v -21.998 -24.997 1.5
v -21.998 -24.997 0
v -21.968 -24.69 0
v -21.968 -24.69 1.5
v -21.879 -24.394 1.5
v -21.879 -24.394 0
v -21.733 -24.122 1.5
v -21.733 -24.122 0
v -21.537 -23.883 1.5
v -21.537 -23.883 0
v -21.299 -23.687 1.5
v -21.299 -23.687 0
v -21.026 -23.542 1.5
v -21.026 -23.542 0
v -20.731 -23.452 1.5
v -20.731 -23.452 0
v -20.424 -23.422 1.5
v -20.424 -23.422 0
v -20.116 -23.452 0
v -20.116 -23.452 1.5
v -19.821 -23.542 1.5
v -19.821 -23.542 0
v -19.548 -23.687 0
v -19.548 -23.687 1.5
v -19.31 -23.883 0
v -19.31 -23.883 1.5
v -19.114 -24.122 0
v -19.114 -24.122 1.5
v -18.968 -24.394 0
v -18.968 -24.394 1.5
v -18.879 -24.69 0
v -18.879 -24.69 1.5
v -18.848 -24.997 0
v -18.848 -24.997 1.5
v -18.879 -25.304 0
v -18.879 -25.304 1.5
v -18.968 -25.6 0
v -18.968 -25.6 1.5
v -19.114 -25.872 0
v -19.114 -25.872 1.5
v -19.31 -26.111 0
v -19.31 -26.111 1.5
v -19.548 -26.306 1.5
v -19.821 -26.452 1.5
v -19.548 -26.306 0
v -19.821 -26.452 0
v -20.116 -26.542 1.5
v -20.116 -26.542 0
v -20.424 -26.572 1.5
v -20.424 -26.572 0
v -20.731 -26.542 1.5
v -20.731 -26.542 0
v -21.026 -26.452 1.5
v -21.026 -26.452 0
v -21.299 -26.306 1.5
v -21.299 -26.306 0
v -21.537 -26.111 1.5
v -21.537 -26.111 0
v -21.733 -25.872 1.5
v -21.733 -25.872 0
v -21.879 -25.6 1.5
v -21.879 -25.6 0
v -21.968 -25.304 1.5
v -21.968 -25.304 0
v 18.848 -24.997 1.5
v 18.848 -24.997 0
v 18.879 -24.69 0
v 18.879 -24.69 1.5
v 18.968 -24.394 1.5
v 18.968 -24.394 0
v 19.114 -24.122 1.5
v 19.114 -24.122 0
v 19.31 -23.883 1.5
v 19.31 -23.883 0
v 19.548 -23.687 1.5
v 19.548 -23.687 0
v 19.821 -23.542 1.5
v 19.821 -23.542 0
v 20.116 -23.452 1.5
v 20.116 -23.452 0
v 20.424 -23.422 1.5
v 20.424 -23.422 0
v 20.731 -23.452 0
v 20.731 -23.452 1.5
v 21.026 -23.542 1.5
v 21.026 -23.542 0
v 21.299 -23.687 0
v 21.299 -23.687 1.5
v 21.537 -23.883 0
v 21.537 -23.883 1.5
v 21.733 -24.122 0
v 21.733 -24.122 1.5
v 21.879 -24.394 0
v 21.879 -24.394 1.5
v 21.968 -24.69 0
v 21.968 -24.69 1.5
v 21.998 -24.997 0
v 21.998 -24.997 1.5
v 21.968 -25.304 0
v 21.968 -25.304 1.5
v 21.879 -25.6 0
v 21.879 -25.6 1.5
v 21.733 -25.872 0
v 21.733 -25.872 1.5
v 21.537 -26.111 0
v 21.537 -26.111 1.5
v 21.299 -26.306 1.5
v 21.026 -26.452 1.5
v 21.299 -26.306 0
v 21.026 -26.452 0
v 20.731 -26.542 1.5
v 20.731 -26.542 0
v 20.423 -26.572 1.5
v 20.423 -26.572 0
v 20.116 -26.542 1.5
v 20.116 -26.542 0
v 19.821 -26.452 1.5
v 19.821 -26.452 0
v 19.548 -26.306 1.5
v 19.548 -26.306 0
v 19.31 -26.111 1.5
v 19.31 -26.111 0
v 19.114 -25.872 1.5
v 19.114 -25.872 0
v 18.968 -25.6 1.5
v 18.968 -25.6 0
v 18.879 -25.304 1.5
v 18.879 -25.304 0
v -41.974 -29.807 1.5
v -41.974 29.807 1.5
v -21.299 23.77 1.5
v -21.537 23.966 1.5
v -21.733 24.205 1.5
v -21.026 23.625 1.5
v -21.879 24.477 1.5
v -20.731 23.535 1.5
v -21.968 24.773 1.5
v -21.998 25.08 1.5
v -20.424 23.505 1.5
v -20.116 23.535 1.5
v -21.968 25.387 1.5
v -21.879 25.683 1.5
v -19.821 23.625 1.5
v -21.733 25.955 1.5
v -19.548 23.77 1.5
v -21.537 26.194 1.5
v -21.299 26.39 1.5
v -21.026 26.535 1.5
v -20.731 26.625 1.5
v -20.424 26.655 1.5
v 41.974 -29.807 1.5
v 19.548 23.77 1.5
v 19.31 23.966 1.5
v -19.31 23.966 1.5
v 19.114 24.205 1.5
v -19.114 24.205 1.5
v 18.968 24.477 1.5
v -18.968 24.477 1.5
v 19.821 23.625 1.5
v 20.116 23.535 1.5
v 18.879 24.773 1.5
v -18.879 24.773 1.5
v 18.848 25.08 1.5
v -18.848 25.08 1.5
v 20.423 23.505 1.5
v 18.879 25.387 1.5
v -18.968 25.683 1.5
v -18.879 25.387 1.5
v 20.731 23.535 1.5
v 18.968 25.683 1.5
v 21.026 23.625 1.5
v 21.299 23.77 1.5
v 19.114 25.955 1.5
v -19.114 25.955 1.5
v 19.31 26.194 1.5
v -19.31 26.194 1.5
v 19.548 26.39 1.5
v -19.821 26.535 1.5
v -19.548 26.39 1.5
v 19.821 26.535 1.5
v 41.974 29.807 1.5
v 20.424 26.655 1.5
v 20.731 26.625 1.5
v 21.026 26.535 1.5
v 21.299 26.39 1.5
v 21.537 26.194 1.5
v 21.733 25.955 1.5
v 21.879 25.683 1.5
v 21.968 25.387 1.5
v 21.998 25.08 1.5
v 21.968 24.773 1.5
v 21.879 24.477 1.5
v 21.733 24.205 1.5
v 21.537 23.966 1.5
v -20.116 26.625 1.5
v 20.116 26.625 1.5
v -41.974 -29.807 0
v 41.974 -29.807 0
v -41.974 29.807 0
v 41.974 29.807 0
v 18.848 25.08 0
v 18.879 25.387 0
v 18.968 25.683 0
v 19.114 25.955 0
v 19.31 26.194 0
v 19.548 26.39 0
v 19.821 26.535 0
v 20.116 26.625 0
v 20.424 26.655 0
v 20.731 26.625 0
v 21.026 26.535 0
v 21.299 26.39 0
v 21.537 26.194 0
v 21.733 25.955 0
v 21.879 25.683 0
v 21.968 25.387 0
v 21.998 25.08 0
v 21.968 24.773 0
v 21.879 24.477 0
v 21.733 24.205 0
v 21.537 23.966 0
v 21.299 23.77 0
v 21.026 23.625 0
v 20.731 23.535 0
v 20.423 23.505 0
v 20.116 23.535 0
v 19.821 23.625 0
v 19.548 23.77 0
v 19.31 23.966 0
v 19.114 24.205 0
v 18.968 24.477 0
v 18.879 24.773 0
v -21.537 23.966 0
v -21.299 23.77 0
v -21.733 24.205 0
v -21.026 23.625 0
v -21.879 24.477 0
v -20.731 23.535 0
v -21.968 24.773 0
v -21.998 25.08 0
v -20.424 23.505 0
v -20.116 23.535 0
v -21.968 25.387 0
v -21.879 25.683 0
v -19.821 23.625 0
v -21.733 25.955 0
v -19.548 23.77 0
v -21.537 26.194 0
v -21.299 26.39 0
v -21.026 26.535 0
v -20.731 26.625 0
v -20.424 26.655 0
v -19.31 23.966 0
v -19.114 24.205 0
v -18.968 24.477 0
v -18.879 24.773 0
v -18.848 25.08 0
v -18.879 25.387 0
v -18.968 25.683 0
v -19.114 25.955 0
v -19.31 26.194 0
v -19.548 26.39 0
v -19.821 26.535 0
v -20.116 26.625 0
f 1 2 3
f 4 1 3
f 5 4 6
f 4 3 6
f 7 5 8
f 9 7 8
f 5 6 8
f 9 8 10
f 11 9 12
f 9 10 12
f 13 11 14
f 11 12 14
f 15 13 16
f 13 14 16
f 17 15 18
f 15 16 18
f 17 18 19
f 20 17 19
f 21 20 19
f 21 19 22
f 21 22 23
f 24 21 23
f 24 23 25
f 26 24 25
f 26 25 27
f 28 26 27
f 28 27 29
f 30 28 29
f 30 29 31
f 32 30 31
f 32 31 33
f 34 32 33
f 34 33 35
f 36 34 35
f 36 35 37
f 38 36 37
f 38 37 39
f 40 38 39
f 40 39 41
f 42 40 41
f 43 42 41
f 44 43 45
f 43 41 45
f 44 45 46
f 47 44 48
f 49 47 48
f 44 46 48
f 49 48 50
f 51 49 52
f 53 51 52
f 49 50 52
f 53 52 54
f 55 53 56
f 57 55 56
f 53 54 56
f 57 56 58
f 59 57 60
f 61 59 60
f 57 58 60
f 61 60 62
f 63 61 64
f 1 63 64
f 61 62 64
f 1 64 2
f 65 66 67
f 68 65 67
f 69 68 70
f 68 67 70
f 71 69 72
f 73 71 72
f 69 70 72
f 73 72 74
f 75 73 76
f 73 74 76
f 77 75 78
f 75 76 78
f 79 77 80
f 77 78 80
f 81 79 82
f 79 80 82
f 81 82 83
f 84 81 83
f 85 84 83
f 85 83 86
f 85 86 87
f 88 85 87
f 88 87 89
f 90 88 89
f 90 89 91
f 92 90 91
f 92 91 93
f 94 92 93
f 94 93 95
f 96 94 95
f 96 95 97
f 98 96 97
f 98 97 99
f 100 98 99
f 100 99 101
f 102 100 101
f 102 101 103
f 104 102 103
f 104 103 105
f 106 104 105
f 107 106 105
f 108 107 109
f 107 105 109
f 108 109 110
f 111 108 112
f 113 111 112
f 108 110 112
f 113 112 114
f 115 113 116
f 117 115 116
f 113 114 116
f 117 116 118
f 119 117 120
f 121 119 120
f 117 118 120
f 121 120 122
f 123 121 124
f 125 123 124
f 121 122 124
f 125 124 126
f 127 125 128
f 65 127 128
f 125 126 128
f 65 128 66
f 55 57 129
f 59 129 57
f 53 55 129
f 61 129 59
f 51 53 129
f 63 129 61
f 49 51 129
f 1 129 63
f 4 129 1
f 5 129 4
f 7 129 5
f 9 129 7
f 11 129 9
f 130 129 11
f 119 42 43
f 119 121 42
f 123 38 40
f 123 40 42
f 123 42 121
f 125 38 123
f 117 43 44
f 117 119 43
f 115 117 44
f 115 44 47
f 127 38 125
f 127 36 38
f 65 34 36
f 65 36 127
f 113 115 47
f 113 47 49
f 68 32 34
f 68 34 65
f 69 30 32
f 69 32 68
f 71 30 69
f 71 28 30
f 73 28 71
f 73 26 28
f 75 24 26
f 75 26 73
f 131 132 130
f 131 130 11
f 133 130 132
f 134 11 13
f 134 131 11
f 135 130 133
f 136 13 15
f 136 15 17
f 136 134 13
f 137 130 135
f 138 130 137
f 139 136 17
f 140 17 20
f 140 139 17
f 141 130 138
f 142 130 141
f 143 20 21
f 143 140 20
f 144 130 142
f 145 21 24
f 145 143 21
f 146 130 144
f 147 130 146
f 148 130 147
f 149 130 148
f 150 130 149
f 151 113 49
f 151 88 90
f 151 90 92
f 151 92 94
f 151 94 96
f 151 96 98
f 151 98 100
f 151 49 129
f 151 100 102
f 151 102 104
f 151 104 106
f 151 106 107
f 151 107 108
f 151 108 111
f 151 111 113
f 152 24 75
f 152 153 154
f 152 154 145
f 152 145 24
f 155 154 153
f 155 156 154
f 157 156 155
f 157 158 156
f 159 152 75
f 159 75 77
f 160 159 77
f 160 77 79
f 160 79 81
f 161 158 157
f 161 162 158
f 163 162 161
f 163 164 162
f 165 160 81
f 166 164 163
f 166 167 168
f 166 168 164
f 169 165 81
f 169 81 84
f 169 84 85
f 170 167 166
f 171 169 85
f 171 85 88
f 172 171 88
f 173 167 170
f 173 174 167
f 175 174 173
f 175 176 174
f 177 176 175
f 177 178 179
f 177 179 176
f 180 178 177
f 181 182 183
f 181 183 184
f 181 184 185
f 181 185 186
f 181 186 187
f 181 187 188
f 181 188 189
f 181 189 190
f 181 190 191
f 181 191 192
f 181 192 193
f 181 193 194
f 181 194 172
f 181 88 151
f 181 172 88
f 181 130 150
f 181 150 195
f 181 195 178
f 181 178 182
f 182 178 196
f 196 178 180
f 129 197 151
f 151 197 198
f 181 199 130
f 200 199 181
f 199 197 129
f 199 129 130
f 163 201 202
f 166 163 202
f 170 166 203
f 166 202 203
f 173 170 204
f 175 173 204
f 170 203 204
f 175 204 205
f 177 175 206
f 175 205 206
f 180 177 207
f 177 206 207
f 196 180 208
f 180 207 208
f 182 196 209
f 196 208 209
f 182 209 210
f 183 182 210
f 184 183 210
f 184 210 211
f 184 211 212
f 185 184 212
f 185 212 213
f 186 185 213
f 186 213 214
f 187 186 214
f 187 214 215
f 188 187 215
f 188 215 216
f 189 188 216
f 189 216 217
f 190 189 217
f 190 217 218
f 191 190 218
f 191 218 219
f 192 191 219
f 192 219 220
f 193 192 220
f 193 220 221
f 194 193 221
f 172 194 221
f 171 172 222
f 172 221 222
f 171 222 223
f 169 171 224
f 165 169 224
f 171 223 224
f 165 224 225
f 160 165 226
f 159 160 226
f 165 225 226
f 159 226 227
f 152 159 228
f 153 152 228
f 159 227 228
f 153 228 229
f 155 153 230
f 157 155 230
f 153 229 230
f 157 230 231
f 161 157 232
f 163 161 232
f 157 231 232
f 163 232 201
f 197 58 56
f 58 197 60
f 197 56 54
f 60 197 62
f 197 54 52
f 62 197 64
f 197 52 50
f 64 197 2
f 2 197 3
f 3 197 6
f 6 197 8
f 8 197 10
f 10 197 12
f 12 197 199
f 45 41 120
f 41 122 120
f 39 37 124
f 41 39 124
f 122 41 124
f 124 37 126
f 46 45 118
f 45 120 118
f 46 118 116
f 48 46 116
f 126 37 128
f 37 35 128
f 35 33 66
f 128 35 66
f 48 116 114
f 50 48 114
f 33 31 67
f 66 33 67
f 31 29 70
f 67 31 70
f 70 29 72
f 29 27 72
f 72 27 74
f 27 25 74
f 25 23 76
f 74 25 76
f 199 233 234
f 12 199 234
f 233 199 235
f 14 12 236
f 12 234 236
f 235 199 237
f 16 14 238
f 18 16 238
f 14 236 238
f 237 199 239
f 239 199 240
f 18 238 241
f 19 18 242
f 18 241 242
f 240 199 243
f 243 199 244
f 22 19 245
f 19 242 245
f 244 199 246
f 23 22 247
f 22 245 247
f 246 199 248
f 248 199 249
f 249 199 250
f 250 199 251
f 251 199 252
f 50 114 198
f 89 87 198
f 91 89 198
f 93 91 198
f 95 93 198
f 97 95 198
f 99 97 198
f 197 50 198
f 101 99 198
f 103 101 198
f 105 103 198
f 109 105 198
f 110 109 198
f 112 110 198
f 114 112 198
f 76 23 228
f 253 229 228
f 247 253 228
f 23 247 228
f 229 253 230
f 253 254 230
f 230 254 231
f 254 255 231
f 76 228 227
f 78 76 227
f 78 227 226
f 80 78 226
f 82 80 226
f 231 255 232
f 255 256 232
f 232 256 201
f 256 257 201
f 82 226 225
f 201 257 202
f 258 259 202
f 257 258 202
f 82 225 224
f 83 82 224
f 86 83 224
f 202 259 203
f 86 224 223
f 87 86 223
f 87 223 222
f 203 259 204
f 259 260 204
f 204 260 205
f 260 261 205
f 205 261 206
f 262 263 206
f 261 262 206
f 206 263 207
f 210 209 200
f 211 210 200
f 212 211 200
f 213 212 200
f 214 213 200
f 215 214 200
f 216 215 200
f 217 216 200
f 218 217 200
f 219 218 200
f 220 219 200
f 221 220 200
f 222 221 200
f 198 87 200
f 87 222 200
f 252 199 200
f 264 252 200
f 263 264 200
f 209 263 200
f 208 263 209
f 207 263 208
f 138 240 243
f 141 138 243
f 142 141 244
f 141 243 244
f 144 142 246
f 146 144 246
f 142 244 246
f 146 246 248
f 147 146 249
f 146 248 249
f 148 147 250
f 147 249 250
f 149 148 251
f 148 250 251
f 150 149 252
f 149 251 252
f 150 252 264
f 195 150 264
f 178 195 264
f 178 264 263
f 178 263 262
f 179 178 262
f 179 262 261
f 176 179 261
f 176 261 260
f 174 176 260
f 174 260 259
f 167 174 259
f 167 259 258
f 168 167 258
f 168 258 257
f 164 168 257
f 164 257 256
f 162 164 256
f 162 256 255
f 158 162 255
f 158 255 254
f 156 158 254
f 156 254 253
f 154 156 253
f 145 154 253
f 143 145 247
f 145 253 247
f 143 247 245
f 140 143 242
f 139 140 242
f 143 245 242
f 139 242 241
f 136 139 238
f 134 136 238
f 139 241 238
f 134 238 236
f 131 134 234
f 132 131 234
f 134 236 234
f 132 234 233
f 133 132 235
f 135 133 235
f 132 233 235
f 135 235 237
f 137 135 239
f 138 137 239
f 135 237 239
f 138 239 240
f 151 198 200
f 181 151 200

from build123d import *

# Parameters (mm, degrees)
F0_W     = 83.947
F0_H     = 59.6138
F1_DEPTH = 1.5
F3_D     = 3.15
F4_D     = 3.15
F5_D     = 3.15
F6_D     = 3.15


with BuildPart() as f1:
    # F0 (on Top) → F1 (new body)
    with BuildSketch(Plane.XY):
        Rectangle(F0_W, F0_H)
    extrude(amount=F1_DEPTH)

    # F3 (through all)
    with Locations(Plane.XY.offset(1.5)):
        with Locations((-20.4235, -24.9969)):
            Hole(F3_D / 2)

    # F4 (through all)
    with Locations(Plane.XY.offset(1.5)):
        with Locations((20.4235, -24.9969)):
            Hole(F4_D / 2)

    # F5 (through all)
    with Locations(Plane.XY.offset(1.5)):
        with Locations((-20.4235, 25.0799947721)):
            Hole(F5_D / 2)

    # F6 (through all)
    with Locations(Plane.XY.offset(1.5)):
        with Locations((20.4235, 25.0799947721)):
            Hole(F6_D / 2)


solid = f1.part
